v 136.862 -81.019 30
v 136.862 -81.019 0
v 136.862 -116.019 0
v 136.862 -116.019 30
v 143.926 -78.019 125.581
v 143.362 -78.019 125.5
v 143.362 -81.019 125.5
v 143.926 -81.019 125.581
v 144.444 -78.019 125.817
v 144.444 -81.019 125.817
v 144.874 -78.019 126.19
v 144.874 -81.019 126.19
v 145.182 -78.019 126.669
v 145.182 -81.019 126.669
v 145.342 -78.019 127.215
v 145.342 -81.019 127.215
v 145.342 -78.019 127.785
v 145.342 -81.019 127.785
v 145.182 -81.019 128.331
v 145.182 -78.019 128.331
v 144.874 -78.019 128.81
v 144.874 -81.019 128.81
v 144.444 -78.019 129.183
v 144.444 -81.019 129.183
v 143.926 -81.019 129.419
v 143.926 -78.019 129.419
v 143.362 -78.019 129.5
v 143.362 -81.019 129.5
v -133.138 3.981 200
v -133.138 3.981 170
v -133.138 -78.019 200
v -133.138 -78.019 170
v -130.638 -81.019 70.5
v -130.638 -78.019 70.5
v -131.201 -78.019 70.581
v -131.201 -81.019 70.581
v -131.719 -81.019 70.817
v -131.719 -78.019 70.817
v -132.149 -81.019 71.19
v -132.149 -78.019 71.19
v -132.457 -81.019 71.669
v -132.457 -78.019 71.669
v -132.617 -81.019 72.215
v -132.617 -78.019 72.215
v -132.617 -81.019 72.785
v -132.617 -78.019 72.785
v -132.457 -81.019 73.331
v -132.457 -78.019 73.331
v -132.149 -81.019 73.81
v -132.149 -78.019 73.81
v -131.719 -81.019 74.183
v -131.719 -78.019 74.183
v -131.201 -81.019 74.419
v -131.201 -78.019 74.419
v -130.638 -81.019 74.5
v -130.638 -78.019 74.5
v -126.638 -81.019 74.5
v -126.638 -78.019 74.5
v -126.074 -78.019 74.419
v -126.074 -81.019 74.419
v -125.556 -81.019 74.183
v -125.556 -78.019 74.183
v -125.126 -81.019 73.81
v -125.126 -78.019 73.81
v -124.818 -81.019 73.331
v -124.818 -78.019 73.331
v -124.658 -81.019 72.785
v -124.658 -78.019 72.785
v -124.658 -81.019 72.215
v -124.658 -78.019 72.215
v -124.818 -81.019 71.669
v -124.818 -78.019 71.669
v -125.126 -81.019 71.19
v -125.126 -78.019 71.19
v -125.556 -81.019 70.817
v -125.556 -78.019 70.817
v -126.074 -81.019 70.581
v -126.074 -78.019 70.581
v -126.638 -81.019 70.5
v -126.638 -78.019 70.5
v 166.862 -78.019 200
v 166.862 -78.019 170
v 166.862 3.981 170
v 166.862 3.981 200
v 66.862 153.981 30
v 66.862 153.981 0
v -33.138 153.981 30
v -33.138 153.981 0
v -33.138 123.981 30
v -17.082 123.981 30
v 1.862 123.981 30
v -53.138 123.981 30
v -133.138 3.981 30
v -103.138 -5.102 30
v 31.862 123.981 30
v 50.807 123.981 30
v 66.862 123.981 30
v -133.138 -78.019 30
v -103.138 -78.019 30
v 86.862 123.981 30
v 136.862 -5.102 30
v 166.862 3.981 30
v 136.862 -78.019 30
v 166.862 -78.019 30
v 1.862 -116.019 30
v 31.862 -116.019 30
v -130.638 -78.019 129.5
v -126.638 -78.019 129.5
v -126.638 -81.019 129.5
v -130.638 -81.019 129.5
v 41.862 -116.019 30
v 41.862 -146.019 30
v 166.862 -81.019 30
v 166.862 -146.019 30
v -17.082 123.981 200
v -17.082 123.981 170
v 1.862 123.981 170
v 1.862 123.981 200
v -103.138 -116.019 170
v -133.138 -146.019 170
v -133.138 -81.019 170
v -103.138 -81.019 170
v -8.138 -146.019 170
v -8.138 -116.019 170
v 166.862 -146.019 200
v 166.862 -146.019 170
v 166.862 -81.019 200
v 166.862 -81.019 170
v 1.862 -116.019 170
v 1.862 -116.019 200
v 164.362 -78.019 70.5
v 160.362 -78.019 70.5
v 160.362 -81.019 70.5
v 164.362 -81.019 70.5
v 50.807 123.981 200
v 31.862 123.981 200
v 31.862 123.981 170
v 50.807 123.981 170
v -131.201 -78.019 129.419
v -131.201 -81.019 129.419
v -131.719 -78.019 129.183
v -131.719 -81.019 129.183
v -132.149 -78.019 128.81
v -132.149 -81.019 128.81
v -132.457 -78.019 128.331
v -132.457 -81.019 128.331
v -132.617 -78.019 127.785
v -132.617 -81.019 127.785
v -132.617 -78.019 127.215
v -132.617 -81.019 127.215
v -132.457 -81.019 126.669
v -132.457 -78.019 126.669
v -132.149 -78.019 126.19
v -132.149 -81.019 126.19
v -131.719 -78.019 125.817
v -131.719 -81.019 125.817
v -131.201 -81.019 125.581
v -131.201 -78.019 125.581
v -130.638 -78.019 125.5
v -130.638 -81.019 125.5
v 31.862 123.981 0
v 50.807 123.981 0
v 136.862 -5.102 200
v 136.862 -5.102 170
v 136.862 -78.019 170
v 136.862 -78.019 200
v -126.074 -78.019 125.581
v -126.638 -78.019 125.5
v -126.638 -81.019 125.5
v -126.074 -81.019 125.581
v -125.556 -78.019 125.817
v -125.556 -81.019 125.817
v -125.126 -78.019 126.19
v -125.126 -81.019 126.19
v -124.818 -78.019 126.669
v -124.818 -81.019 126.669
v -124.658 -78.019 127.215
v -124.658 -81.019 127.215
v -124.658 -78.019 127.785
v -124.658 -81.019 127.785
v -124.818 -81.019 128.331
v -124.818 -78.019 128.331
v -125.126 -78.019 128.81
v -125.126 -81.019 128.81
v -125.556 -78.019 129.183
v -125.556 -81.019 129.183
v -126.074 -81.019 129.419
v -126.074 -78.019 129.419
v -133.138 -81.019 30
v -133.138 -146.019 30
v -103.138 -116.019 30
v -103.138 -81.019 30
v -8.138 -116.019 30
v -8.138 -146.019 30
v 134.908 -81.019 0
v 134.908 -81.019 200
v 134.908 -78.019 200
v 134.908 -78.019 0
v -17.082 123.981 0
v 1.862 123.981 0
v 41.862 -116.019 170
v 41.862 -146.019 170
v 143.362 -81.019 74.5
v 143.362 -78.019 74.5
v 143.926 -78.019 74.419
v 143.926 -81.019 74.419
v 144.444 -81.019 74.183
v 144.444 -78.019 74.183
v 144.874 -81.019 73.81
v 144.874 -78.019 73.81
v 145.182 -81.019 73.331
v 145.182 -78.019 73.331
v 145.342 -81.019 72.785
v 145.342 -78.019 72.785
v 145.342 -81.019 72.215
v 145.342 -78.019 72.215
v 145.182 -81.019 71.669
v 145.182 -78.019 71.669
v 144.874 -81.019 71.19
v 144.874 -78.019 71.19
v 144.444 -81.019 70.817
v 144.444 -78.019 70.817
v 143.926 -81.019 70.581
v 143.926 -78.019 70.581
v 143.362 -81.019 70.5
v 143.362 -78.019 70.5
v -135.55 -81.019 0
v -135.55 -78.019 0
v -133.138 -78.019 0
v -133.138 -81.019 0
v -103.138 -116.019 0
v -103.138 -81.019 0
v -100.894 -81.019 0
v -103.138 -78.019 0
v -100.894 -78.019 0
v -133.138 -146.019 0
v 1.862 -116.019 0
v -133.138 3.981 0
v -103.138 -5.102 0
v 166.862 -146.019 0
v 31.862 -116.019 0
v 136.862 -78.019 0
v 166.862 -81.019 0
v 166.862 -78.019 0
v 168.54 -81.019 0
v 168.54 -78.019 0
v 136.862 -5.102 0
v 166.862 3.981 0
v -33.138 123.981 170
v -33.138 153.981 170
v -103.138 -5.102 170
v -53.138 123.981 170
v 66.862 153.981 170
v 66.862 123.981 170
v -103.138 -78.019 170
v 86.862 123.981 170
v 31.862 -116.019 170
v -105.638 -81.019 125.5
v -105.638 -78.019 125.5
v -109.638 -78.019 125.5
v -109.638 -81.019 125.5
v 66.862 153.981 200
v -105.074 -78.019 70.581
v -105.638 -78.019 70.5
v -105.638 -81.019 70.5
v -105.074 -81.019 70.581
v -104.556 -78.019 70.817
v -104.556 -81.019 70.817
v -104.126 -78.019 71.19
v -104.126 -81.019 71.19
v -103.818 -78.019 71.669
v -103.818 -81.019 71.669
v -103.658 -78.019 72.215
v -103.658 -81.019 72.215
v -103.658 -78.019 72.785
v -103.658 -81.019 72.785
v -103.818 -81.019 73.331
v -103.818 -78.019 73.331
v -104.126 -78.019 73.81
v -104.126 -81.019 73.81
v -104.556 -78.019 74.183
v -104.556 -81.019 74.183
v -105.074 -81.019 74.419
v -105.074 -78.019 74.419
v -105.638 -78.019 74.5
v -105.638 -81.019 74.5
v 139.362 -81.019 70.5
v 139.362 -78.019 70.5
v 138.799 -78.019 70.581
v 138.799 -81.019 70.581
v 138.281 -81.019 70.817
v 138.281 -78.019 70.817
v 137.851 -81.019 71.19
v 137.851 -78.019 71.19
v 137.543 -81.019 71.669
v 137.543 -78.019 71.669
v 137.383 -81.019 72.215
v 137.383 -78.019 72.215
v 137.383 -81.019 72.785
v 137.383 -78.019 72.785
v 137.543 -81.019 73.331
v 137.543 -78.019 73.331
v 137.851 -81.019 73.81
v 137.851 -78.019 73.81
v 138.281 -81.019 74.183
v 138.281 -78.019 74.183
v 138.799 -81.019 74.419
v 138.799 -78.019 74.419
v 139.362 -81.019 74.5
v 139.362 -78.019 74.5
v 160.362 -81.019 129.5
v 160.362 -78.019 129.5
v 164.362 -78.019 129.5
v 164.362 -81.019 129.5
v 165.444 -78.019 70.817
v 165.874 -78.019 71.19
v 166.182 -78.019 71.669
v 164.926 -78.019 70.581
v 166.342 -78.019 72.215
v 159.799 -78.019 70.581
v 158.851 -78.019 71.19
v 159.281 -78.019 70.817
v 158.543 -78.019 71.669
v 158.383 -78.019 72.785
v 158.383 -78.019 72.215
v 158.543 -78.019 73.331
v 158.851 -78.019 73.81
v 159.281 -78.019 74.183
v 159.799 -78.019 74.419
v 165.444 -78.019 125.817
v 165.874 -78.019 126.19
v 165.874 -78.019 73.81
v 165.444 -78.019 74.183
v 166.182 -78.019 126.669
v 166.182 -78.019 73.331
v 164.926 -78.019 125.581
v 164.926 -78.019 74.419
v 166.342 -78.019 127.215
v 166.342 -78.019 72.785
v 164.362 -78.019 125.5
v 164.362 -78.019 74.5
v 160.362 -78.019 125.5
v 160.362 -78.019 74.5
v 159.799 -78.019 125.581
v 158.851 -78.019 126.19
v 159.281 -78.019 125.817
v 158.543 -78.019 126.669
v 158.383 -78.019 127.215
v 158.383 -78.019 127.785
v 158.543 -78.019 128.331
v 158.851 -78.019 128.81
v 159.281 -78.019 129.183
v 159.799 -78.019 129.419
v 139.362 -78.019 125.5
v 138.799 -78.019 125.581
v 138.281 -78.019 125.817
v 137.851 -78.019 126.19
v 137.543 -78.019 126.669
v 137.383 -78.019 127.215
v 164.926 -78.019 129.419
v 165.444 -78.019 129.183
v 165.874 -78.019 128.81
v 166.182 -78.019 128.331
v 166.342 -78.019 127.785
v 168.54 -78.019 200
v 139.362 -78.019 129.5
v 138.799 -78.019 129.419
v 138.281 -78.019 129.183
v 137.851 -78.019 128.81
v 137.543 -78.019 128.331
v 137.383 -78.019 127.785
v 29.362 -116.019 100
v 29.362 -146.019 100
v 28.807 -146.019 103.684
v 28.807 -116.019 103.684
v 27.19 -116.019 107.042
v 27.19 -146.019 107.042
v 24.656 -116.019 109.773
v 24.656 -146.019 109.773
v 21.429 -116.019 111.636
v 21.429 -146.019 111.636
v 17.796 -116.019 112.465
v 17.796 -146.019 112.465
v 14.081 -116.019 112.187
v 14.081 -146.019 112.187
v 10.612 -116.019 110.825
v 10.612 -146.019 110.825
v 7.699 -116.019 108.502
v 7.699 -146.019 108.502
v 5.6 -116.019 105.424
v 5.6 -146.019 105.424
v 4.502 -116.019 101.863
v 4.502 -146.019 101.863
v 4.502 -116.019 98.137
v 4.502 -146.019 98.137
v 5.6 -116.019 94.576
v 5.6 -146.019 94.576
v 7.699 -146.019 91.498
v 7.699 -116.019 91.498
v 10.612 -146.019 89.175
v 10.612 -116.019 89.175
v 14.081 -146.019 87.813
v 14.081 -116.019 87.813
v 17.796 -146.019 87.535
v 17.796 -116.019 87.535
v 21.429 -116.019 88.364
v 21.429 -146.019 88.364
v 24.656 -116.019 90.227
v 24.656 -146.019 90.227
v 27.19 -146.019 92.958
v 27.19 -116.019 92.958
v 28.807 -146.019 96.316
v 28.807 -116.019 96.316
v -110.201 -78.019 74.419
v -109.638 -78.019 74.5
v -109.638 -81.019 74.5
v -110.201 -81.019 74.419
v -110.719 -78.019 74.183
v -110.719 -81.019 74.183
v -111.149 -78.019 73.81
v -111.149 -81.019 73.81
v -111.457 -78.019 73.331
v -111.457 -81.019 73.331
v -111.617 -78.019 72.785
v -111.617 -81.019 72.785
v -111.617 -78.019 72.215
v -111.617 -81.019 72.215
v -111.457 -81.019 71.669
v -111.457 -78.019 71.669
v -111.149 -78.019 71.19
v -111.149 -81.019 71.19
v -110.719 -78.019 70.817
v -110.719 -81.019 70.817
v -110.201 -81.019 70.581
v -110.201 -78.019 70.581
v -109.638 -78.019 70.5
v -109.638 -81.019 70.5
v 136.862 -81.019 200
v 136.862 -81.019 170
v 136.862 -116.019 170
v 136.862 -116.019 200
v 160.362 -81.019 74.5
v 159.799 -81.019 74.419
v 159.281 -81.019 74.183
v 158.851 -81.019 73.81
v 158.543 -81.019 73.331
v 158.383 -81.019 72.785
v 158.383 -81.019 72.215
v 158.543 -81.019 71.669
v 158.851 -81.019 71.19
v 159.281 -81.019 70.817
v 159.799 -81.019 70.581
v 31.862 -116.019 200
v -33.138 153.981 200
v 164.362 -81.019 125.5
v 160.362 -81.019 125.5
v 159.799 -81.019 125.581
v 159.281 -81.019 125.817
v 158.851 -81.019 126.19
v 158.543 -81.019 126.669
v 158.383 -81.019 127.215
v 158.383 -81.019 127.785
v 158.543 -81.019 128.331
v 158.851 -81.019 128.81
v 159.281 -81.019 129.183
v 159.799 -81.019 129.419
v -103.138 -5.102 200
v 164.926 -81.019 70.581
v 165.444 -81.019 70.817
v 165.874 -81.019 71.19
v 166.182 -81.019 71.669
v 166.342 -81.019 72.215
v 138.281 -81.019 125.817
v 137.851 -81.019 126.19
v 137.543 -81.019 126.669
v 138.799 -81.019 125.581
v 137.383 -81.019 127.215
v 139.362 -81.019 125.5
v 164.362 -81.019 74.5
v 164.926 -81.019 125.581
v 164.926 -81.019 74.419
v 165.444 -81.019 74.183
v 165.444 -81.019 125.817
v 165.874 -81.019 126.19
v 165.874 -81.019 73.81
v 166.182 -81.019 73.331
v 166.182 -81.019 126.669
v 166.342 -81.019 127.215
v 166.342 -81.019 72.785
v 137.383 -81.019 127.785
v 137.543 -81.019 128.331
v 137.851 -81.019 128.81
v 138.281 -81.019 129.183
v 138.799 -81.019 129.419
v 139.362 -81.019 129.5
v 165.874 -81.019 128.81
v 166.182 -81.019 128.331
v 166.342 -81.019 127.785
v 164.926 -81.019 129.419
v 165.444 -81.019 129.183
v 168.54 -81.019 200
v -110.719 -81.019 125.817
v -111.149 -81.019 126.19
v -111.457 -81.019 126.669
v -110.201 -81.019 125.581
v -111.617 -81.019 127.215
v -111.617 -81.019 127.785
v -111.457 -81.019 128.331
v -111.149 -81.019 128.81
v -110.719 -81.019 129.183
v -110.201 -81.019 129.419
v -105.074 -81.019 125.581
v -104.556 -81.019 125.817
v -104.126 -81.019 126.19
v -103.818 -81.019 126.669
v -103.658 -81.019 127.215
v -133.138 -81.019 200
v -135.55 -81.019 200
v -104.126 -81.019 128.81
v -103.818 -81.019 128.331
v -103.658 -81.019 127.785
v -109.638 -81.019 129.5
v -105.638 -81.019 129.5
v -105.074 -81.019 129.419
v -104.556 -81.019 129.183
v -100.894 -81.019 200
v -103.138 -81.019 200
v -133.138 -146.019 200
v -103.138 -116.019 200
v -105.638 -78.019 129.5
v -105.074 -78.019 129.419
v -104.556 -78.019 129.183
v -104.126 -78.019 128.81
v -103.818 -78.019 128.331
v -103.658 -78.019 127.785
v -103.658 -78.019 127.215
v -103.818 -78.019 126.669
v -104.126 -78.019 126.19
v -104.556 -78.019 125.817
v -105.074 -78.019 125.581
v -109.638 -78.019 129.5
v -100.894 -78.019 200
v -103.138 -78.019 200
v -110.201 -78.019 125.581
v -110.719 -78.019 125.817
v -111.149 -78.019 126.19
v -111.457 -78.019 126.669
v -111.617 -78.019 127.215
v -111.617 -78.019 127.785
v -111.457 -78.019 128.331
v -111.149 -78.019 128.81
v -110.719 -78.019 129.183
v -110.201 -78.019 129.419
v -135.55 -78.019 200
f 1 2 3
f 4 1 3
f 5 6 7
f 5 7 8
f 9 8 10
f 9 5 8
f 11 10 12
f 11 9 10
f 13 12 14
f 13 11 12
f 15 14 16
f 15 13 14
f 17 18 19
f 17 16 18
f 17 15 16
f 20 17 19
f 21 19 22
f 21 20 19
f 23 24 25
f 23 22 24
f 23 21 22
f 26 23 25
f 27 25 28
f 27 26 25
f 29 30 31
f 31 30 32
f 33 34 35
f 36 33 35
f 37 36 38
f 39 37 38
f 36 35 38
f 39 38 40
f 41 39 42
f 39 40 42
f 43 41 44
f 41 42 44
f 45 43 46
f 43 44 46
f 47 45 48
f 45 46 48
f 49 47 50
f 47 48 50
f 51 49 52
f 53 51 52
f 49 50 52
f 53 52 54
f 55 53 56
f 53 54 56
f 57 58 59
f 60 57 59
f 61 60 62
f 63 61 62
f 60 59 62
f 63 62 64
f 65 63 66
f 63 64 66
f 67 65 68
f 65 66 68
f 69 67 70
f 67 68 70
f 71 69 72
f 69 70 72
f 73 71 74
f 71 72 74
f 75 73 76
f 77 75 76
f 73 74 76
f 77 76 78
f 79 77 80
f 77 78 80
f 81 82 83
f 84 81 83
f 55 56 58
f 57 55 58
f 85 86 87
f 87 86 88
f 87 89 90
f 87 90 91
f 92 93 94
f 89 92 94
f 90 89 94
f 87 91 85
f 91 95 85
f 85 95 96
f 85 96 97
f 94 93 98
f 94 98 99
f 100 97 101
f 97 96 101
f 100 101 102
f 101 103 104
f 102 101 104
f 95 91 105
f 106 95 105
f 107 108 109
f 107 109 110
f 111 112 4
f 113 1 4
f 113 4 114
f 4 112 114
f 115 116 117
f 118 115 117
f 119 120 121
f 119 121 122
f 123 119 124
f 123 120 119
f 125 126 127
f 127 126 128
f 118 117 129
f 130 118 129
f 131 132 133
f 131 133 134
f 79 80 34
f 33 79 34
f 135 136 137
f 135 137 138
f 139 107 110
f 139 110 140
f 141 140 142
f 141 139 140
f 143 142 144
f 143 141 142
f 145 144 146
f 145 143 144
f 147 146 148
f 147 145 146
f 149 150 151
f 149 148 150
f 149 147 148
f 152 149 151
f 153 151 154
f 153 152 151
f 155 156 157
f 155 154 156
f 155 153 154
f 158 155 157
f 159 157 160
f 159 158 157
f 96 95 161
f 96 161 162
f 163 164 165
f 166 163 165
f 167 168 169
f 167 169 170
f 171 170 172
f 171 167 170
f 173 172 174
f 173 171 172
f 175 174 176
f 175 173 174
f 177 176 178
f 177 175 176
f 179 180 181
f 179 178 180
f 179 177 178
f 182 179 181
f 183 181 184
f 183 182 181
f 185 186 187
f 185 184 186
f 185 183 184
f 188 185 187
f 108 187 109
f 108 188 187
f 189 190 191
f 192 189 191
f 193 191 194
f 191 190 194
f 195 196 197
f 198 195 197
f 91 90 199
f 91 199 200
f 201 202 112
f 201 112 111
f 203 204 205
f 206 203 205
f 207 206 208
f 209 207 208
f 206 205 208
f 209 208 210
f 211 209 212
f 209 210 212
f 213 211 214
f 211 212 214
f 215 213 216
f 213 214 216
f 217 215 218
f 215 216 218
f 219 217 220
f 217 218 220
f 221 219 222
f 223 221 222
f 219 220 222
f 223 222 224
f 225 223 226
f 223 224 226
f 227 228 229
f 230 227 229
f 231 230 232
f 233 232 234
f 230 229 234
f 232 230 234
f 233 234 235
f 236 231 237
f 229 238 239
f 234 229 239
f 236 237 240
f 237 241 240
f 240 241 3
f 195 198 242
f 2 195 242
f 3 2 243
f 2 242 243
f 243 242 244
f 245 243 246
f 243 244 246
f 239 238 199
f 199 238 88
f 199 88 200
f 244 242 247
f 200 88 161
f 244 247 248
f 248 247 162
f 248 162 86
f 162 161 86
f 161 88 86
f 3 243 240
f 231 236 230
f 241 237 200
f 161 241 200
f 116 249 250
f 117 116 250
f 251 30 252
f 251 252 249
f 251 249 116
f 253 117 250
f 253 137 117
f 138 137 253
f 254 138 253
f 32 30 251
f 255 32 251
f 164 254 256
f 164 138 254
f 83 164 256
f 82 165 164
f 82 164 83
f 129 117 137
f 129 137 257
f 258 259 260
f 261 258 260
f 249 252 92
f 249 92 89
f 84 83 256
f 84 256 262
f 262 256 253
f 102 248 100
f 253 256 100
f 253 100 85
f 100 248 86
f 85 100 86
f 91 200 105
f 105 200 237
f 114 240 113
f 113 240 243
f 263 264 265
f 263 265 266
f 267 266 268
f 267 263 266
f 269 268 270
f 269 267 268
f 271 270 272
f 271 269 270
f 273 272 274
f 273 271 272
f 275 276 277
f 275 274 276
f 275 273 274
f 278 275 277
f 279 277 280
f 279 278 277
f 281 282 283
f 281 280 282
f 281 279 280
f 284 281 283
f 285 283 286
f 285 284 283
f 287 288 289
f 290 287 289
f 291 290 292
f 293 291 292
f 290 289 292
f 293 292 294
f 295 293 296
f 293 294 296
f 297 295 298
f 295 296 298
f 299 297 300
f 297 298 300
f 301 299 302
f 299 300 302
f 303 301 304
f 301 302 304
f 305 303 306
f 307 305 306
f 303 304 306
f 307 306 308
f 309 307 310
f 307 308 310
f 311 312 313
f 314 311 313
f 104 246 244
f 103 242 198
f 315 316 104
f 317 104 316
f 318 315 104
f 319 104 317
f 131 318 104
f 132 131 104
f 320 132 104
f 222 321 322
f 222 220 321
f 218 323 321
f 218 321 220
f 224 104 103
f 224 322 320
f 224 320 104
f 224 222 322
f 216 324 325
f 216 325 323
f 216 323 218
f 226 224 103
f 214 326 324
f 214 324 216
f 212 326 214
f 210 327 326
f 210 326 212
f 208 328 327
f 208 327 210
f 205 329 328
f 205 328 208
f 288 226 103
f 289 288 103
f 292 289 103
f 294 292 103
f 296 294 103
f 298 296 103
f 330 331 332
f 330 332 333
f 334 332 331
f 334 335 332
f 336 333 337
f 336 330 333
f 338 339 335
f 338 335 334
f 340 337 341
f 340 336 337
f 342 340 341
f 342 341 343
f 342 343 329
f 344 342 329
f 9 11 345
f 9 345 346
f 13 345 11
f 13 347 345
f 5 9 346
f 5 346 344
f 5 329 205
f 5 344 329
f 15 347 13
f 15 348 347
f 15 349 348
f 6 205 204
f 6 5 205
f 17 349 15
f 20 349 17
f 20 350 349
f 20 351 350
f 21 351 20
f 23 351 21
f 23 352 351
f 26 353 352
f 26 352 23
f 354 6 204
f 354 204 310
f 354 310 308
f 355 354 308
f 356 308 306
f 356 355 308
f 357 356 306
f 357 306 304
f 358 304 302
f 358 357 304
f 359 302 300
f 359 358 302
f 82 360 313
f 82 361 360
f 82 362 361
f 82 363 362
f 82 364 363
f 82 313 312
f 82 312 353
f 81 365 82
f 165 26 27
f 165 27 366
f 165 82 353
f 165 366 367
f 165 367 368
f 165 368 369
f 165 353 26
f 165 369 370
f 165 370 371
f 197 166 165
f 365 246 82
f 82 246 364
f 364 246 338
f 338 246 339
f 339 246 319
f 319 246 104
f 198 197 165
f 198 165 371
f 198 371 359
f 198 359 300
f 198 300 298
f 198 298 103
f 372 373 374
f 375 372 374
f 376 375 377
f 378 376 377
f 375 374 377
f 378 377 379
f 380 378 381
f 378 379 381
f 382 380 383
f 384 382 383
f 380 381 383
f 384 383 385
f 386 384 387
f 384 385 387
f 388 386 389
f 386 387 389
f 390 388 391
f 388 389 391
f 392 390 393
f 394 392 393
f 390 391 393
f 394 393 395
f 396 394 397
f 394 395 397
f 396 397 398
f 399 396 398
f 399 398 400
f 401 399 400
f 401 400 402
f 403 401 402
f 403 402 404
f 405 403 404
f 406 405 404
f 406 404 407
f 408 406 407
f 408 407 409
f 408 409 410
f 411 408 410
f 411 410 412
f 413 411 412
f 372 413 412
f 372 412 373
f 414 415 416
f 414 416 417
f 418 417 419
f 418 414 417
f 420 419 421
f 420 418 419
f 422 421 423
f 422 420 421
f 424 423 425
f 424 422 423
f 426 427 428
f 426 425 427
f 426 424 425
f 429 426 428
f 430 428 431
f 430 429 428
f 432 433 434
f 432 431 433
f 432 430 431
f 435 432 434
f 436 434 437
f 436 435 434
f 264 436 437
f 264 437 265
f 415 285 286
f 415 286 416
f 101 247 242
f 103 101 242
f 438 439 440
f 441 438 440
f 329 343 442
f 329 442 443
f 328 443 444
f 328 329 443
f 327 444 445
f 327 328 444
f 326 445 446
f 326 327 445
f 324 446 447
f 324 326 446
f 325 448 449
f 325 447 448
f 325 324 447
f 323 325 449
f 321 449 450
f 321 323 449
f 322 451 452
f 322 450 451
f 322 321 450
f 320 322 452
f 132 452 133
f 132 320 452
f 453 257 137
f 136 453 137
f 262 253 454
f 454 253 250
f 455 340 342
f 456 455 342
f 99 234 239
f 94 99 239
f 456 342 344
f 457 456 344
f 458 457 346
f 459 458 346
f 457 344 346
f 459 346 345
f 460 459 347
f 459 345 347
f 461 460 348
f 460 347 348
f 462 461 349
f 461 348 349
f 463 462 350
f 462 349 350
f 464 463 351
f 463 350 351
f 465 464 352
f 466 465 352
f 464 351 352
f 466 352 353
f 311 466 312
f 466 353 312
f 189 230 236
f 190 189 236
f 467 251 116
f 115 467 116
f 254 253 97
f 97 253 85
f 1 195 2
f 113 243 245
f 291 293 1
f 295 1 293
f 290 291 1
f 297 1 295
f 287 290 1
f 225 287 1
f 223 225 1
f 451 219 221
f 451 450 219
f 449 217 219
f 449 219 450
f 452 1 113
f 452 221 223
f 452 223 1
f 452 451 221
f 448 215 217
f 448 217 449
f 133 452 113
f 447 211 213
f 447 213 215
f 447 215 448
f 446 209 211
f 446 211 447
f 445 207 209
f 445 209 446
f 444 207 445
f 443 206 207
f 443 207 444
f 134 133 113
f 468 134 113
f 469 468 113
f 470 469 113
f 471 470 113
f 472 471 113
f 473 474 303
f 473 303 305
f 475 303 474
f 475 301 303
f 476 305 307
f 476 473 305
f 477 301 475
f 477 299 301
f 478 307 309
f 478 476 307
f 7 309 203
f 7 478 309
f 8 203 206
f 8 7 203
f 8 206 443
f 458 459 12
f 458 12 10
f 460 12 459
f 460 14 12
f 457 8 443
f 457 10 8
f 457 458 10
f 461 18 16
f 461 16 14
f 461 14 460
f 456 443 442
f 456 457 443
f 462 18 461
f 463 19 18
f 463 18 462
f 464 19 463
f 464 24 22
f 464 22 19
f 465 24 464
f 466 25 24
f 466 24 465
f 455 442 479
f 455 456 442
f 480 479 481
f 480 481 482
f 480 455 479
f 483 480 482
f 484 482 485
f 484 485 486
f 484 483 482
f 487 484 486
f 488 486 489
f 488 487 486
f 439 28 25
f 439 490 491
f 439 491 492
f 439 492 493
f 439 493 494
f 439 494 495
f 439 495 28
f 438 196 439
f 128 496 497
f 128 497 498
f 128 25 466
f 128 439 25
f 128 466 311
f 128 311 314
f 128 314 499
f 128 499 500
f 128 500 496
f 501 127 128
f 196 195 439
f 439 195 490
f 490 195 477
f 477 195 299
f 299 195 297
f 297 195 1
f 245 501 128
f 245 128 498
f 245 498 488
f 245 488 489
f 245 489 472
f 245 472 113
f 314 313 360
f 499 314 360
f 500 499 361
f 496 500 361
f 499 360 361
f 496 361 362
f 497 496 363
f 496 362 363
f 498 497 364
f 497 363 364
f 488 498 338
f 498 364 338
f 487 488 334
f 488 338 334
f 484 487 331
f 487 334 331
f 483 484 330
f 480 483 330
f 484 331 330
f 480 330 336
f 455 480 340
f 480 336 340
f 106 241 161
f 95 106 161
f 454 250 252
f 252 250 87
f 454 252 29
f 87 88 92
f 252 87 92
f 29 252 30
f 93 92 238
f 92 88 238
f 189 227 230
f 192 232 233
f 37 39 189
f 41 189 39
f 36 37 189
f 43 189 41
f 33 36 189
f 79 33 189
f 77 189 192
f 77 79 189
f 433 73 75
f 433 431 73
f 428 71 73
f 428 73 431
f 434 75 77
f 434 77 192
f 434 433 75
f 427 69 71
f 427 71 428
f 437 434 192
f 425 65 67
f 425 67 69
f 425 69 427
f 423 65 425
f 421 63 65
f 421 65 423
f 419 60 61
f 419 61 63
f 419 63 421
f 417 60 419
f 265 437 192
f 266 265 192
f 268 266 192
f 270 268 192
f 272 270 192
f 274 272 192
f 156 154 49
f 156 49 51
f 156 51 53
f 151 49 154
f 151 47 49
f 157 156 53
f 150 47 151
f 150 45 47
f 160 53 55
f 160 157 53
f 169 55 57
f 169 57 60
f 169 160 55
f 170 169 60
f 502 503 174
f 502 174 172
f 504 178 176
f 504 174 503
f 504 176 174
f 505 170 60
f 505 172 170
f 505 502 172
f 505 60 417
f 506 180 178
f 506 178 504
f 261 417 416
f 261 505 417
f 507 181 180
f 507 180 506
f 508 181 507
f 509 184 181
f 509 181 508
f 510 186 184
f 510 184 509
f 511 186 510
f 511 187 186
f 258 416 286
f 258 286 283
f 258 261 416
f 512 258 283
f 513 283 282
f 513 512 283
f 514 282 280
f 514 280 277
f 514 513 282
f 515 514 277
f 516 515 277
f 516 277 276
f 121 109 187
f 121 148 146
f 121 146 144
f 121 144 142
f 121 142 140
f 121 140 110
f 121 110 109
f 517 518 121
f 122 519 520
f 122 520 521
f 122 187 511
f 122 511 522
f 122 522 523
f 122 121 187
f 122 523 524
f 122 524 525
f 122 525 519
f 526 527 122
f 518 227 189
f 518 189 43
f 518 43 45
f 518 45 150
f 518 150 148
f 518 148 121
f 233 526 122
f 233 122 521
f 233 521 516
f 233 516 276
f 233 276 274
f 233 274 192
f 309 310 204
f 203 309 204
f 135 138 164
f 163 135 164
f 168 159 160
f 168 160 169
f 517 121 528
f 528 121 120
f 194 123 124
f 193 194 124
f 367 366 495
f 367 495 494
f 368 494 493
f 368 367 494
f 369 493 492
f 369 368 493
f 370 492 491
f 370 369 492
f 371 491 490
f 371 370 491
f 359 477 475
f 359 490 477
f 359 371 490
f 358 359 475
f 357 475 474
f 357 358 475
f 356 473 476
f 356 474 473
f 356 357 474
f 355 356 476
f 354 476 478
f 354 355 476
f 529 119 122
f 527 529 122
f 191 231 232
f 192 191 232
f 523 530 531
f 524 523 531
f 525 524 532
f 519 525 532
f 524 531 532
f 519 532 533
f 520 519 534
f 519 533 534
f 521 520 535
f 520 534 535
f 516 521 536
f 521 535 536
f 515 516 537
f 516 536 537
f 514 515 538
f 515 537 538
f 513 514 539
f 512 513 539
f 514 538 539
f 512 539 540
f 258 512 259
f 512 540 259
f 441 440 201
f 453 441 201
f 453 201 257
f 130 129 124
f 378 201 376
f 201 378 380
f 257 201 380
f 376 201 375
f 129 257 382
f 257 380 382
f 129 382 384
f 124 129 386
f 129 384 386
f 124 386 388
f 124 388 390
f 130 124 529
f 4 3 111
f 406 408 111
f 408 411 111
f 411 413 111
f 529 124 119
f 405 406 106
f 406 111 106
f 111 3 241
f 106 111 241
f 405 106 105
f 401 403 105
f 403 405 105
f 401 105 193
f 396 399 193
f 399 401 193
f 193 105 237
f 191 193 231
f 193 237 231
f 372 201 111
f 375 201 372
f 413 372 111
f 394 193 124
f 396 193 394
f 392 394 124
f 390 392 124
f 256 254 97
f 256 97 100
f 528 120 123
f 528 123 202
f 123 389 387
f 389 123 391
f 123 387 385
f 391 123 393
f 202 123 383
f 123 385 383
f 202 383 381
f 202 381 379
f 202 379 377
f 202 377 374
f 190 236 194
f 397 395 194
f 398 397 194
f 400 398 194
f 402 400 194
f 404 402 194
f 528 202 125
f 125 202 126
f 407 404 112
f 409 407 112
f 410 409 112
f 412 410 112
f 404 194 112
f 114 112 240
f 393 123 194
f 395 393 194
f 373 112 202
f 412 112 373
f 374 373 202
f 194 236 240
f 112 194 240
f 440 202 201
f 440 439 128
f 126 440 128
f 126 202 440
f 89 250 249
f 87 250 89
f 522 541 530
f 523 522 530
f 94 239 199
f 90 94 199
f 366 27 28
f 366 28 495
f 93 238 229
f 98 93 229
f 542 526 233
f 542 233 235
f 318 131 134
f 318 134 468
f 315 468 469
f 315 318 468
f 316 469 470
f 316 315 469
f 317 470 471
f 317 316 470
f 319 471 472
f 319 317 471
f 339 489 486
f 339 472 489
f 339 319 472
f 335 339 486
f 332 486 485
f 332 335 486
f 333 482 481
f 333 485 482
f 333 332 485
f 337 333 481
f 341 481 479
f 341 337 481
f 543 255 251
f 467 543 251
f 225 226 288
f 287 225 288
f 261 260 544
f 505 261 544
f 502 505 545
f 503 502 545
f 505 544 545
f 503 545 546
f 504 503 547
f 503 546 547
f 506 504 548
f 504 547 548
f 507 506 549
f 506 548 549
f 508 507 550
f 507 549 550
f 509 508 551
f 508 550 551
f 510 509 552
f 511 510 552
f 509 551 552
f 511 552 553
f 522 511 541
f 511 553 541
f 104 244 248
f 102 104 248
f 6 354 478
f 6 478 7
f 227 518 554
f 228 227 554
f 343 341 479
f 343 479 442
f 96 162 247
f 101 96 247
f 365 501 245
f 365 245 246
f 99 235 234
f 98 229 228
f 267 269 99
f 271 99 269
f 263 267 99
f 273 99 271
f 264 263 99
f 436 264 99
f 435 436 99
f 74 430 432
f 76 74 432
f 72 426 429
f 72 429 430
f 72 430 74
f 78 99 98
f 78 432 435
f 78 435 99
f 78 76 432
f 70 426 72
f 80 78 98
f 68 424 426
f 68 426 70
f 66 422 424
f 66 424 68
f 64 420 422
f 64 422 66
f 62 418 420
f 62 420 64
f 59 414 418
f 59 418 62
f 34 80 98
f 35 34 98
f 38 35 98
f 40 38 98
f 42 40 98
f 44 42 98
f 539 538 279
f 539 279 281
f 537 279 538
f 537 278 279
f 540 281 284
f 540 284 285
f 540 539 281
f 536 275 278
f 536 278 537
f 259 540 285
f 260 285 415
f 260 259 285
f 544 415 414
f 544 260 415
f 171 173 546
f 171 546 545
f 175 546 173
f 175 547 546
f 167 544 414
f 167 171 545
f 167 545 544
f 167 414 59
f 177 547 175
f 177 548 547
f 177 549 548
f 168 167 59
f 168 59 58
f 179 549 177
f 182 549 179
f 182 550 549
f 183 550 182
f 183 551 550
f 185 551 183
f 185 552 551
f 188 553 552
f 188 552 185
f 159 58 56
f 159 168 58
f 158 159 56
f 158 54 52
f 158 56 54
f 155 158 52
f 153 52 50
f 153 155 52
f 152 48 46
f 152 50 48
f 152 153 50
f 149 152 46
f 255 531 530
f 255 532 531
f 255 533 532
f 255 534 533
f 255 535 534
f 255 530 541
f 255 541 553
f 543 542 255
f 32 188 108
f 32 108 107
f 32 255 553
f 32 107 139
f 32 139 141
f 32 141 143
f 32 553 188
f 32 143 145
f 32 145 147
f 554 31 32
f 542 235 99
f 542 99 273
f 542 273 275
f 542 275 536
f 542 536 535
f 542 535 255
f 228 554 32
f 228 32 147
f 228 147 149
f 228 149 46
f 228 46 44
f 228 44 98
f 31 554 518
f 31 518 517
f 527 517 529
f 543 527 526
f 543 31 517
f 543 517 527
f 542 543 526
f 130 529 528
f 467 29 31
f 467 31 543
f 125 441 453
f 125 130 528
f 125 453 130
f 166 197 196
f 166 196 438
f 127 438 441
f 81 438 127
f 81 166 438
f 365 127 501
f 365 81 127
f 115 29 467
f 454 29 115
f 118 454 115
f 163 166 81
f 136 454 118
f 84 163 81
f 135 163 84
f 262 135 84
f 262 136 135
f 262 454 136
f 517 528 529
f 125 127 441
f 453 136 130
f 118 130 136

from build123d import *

# Parameters (mm, degrees)
BOSS_EXTRUDE4_DEPTH = 200
SKETCH5_W           = 300
SKETCH5_H           = 140
CUT_EXTRUDE3_DEPTH  = 270
SKETCH6_W           = 2.411871081
SKETCH6_H           = 3
SKETCH6_W_2         = 30
SKETCH6_W_3         = 2.243969638
SKETCH6_W_4         = 1.678083374
SKETCH6_W_5         = 1.954362123
BOSS_EXTRUDE6_DEPTH = 200
SKETCH7_W           = 100
SKETCH7_H           = 140
CUT_EXTRUDE4_DEPTH  = 174
SKETCH9_W           = 50
SKETCH9_H           = 30
BOSS_EXTRUDE7_DEPTH = 193
SKETCH10_R          = 12.5
CUT_EXTRUDE5_DEPTH  = 193
CUT_EXTRUDE23_DEPTH = 10


with BuildPart() as part:
    # Sketch1 → Boss-Extrude4 (new body)
    with BuildSketch(Plane.XY):
        Polygon((1.862238879, 123.981049527), (1.862238879, 153.981049527), (-33.137761121, 153.981049527), (-133.137761121, 3.981049527), (-133.137761121, -146.018950473), (-53.137761121, -146.018950473), (86.862238879, -146.018950473), (166.862238879, -146.018950473), (166.862238879, 3.981049527), (66.862238879, 153.981049527), (31.862238879, 153.981049527), (31.862238879, 123.981049527), (50.806726124, 123.981049527), (136.862238879, -5.102219605), (136.862238879, -116.018950473), (31.862238879, -116.018950473), (31.862238879, -46.018950473), (1.862238879, -46.018950473), (1.862238879, -116.018950473), (-103.137761121, -116.018950473), (-103.137761121, -5.102219605), (-17.082248367, 123.981049527), align=None)
        Polygon((31.862238879, 153.981049527), (1.862238879, 153.981049527), (1.862238879, 123.981049527), (1.862238879, -46.018950473), (31.862238879, -46.018950473), (31.862238879, 123.981049527), align=None)
    extrude(amount=BOSS_EXTRUDE4_DEPTH)

    # Sketch5 → Cut-Extrude3 (cut)
    with BuildSketch(Plane.XZ.offset(146.018950473)):
        with Locations((16.862238879, 100)):
            Rectangle(SKETCH5_W, SKETCH5_H)
    extrude(amount=-CUT_EXTRUDE3_DEPTH, mode=Mode.SUBTRACT)

    # Sketch6 → Boss-Extrude6 (add)
    with BuildSketch(Plane.XY.offset(200)):
        with Locations((-134.343696662, -79.518950473)):
            Rectangle(SKETCH6_W, SKETCH6_H)
        with Locations((-118.137761121, -79.518950473)):
            Rectangle(SKETCH6_W_2, SKETCH6_H)
        with Locations((-102.015776302, -79.518950473)):
            Rectangle(SKETCH6_W_3, SKETCH6_H)
        with Locations((151.862238879, -79.518950473)):
            Rectangle(SKETCH6_W_2, SKETCH6_H)
        with Locations((167.701280566, -79.518950473)):
            Rectangle(SKETCH6_W_4, SKETCH6_H)
        with Locations((135.885057818, -79.518950473)):
            Rectangle(SKETCH6_W_5, SKETCH6_H)
    extrude(amount=-BOSS_EXTRUDE6_DEPTH)

    # Sketch7 → Cut-Extrude4 (cut)
    with BuildSketch(Plane(origin=(0, 153.981049527, 0), x_dir=(1, 0, 0), z_dir=(0, 1, 0))):
        with Locations((16.862238879, -100)):
            Rectangle(SKETCH7_W, SKETCH7_H)
    extrude(amount=-CUT_EXTRUDE4_DEPTH, mode=Mode.SUBTRACT)

    # Sketch9 → Boss-Extrude7 (add)
    with BuildSketch(Plane(origin=(0, 0, 0), x_dir=(-1, 0, 0), z_dir=(0, 0, -1))):
        with Locations((-16.862238879, -131.018950473)):
            Rectangle(SKETCH9_W, SKETCH9_H)
    extrude(amount=-BOSS_EXTRUDE7_DEPTH)

    # Sketch10 → Cut-Extrude5 (cut)
    with BuildSketch(Plane.XZ.offset(146.018950473)):
        with Locations((16.862238879, 100)):
            Circle(SKETCH10_R)
    extrude(amount=-CUT_EXTRUDE5_DEPTH, mode=Mode.SUBTRACT)

    # Sketch11 → Cut-Extrude23 (cut)
    with BuildSketch(Plane(origin=(0, -78.018950473, 0), x_dir=(1, 0, 0), z_dir=(0, 1, 0))):
        with BuildLine():
            Line((139.362238879, -125.5), (143.362238879, -125.5))
            ThreePointArc((143.362238879, -125.5), (145.362238879, -127.5), (143.362238879, -129.5))
            Line((143.362238879, -129.5), (139.362238879, -129.5))
            ThreePointArc((139.362238879, -129.5), (137.362238879, -127.5), (139.362238879, -125.5))
        make_face()
        with BuildLine():
            Line((164.362238879, -125.5), (160.362238879, -125.5))
            ThreePointArc((160.362238879, -125.5), (158.362238879, -127.5), (160.362238879, -129.5))
            Line((160.362238879, -129.5), (164.362238879, -129.5))
            ThreePointArc((164.362238879, -129.5), (166.362238879, -127.5), (164.362238879, -125.5))
        make_face()
        with BuildLine():
            Line((164.362238879, -74.5), (160.362238879, -74.5))
            ThreePointArc((160.362238879, -74.5), (158.362238879, -72.5), (160.362238879, -70.5))
            Line((160.362238879, -70.5), (164.362238879, -70.5))
            ThreePointArc((164.362238879, -70.5), (166.362238879, -72.5), (164.362238879, -74.5))
        make_face()
        with BuildLine():
            Line((139.362238879, -74.5), (143.362238879, -74.5))
            ThreePointArc((143.362238879, -74.5), (145.362238879, -72.5), (143.362238879, -70.5))
            Line((143.362238879, -70.5), (139.362238879, -70.5))
            ThreePointArc((139.362238879, -70.5), (137.362238879, -72.5), (139.362238879, -74.5))
        make_face()
        with BuildLine():
            Line((-130.637761121, -125.5), (-126.637761121, -125.5))
            ThreePointArc((-126.637761121, -125.5), (-124.637761121, -127.5), (-126.637761121, -129.5))
            Line((-126.637761121, -129.5), (-130.637761121, -129.5))
            ThreePointArc((-130.637761121, -129.5), (-132.637761121, -127.5), (-130.637761121, -125.5))
        make_face()
        with BuildLine():
            Line((-105.637761121, -125.5), (-109.637761121, -125.5))
            ThreePointArc((-109.637761121, -125.5), (-111.637761121, -127.5), (-109.637761121, -129.5))
            Line((-109.637761121, -129.5), (-105.637761121, -129.5))
            ThreePointArc((-105.637761121, -129.5), (-103.637761121, -127.5), (-105.637761121, -125.5))
        make_face()
        with BuildLine():
            Line((-130.637761121, -74.5), (-126.637761121, -74.5))
            ThreePointArc((-126.637761121, -74.5), (-124.637761121, -72.5), (-126.637761121, -70.5))
            Line((-126.637761121, -70.5), (-130.637761121, -70.5))
            ThreePointArc((-130.637761121, -70.5), (-132.637761121, -72.5), (-130.637761121, -74.5))
        make_face()
        with BuildLine():
            Line((-105.637761121, -74.5), (-109.637761121, -74.5))
            ThreePointArc((-109.637761121, -74.5), (-111.637761121, -72.5), (-109.637761121, -70.5))
            Line((-109.637761121, -70.5), (-105.637761121, -70.5))
            ThreePointArc((-105.637761121, -70.5), (-103.637761121, -72.5), (-105.637761121, -74.5))
        make_face()
    extrude(amount=-CUT_EXTRUDE23_DEPTH, mode=Mode.SUBTRACT)


solid = part.part
